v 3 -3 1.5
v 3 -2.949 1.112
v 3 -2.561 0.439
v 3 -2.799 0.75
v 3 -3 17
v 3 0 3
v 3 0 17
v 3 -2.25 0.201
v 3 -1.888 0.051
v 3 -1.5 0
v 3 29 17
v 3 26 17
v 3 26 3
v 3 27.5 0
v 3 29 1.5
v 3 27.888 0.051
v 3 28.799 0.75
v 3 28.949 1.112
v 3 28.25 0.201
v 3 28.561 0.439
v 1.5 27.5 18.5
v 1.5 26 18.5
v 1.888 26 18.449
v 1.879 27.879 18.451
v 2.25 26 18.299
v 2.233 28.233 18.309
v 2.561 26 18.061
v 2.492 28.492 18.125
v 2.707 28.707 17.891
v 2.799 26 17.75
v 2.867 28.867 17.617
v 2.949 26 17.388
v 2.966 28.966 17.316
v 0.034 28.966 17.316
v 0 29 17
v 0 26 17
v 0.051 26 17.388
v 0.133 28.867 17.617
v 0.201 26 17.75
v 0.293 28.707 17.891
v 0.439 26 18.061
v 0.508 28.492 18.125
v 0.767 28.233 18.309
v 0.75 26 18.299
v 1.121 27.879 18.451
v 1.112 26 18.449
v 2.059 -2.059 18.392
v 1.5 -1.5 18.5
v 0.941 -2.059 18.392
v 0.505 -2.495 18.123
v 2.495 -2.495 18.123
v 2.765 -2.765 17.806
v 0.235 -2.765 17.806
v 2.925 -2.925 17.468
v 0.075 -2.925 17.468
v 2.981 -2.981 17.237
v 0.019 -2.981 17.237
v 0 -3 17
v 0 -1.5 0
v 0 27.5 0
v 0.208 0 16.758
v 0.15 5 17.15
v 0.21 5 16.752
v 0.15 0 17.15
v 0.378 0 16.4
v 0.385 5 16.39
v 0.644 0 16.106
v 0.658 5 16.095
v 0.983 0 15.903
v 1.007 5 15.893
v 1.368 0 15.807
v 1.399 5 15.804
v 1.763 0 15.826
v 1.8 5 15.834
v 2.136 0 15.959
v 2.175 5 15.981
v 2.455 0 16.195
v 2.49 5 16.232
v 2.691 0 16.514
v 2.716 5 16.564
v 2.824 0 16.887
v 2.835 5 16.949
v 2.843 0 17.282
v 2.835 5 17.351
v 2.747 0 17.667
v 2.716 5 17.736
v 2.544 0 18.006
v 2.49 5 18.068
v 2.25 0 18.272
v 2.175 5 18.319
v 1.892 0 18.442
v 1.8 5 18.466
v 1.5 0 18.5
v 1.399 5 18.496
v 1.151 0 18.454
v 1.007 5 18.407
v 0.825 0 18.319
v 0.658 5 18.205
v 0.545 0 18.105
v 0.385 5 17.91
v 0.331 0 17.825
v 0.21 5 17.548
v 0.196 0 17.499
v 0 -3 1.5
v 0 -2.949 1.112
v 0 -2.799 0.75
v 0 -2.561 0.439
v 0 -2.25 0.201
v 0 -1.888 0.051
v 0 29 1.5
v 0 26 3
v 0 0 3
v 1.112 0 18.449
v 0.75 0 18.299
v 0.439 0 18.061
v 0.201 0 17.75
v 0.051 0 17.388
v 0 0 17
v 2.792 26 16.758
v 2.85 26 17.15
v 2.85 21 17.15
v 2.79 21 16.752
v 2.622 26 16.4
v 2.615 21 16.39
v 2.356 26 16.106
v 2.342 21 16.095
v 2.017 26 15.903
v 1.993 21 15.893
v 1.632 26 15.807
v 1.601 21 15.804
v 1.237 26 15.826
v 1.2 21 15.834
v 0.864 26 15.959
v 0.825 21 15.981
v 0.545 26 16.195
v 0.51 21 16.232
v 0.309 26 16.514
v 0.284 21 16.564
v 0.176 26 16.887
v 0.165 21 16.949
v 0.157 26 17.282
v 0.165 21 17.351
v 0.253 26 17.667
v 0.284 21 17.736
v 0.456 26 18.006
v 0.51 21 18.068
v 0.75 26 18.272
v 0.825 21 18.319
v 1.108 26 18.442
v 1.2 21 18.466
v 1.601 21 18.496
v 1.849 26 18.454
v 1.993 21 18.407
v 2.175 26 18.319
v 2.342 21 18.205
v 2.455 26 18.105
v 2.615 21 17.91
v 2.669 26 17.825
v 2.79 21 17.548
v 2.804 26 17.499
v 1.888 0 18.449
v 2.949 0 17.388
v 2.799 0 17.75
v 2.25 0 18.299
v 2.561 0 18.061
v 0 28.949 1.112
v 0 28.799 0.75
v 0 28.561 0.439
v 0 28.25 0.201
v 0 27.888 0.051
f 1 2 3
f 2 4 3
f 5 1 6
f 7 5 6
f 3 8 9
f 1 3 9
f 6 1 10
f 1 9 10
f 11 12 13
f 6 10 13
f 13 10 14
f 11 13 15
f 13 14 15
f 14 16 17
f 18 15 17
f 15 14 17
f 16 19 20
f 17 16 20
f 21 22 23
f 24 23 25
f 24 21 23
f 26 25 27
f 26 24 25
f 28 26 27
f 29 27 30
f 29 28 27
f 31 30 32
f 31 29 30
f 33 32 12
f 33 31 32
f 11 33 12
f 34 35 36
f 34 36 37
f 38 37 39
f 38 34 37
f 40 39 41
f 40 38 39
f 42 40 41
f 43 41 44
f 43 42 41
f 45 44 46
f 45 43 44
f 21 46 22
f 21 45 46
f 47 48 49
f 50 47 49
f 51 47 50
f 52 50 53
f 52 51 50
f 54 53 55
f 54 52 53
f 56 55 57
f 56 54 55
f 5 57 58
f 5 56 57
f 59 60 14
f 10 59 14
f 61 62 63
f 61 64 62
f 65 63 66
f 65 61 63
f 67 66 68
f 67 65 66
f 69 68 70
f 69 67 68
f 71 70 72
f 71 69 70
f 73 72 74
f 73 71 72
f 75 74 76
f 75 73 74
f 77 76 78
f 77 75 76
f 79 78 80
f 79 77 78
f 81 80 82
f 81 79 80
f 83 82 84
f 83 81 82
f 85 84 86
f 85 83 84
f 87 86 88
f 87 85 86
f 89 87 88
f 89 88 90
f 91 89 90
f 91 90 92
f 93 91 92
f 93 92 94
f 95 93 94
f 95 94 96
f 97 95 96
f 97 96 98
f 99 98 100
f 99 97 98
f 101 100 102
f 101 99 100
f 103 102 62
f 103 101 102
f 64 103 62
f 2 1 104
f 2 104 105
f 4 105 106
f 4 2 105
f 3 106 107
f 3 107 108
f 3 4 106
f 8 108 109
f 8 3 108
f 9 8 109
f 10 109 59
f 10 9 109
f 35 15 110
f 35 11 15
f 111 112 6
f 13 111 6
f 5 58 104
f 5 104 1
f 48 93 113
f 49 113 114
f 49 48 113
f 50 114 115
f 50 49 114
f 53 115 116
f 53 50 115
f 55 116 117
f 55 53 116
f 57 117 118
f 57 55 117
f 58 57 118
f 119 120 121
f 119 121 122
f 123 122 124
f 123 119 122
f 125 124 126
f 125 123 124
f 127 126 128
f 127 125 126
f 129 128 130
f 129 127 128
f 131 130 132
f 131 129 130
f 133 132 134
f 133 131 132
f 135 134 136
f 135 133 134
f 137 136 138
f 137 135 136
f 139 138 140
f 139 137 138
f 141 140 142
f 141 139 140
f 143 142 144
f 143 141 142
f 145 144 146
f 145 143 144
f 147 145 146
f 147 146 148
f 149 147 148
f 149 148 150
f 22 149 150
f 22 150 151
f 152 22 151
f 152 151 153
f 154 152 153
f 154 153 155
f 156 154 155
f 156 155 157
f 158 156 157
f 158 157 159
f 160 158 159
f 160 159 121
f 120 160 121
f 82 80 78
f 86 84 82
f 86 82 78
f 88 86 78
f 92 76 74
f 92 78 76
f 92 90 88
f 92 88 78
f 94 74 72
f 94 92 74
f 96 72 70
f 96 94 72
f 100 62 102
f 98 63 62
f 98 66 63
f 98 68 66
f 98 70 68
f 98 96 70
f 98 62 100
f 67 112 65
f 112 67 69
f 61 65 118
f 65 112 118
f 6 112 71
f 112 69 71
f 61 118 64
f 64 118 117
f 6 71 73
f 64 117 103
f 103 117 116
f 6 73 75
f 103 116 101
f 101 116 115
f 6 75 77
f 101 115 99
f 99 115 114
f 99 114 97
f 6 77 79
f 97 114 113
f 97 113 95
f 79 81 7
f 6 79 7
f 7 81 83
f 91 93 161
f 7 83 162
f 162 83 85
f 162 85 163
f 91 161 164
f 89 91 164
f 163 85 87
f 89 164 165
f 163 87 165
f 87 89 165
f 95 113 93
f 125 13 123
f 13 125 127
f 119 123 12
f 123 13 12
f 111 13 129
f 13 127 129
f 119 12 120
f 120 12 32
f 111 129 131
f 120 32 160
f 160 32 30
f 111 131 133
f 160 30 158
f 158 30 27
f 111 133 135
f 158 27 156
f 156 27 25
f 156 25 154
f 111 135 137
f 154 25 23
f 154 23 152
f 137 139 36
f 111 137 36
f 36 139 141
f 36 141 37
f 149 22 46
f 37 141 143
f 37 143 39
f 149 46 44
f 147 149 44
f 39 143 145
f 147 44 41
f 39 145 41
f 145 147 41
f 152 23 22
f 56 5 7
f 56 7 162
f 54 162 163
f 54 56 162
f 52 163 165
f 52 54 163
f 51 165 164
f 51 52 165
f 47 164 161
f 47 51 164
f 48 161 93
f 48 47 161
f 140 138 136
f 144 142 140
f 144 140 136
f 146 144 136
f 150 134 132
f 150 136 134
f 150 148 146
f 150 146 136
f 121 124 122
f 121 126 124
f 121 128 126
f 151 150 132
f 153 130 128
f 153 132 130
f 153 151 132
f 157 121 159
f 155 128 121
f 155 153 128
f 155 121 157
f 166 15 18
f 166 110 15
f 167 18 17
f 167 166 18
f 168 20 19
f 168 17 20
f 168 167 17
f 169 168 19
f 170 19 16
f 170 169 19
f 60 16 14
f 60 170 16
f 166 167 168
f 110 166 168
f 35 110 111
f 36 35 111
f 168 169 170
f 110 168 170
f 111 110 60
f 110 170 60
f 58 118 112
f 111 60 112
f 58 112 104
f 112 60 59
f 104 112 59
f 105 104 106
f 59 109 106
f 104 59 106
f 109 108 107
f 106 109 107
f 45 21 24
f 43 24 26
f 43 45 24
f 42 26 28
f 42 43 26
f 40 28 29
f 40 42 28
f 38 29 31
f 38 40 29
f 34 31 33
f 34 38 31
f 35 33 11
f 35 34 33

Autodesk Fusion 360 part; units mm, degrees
sketch "Sketch6" plane through (0, 0, 0) normal (0, 0, 1) x (1, 0, 0)
  line L0 (0, 0) -> (3, 0)
  line L1 (3, 0) -> (3, 26)
  line L2 (3, 26) -> (0, 26)
  line L3 (0, 26) -> (0, 0)
  dimension "d27" = 3
  dimension "d28" = 26
extrude "Extrude8" add sketch "Sketch6" along normal blind 3
sketch "Sketch7" plane through (0, 0, 0) normal (0, 1, 0) x (1, 0, 0)
sketch "Sketch8" plane through (0, 0, 0) normal (0, -1, 0) x (1, 0, 0)
  line L0 (0, 0) -> (3, 0)
  line L1 (3, 0) -> (3, 3)
  line L2 (3, 3) -> (0, 3)
  line L3 (0, 3) -> (0, 0)
  line L4 (3, 3) -> (0, 3)
  line L5 (0, 3) -> (0, 18.5)
  line L6 (0, 18.5) -> (3, 18.5)
  line L7 (3, 18.5) -> (3, 3)
  dimension "d31" = 3
  dimension "d32" = 15.5
extrude "Extrude9" add sketch "Sketch8" along normal blind 3
sketch "Sketch9" plane through (0, 26, 0) normal (0, 1, 0) x (-1, 0, 0)
  line L0 (-3, 0) -> (0, 0)
  line L1 (0, 0) -> (0, 3)
  line L2 (0, 3) -> (-3, 3)
  line L3 (-3, 3) -> (-3, 0)
  line L4 (0, 0) -> (-3, 0)
  line L5 (-3, 0) -> (-3, 18.5)
  line L6 (-3, 18.5) -> (0, 18.5)
  line L7 (0, 18.5) -> (0, 0)
  dimension "d35" = 3
  dimension "d36" = 18.5
extrude "Extrude10" add sketch "Sketch9" along normal blind 3
sketch "Sketch10" plane through (0, 0, 0) normal (0, 1, 0) x (-1, 0, 0)
  line L0 (-3, 3) -> (0, 3)
  line L1 (0, 3) -> (0, 18.5)
  line L2 (0, 18.5) -> (-3, 18.5)
  line L3 (-3, 18.5) -> (-3, 3)
  line L4 (-1.5, 18.5) -> (-1.5, 17)
  circle A0 centre (-1.5, 17) radius 1.5
  dimension "d39" = 1.5
  dimension "d40" = 3
sketch "Sketch12" plane through (0, 26, 0) normal (0, -1, 0) x (1, 0, 0)
  line L0 (0, 3) -> (3, 3)
  line L1 (3, 3) -> (3, 18.5)
  line L2 (3, 18.5) -> (0, 18.5)
  line L3 (0, 18.5) -> (0, 3)
  line L4 (1.5, 18.5) -> (1.5, 17.15)
  circle A0 centre (1.5, 17.15) radius 1.35
  dimension "d53" = 1.35
  dimension "d54" = 2.7
extrude "Extrude15" add sketch "Sketch12" along normal blind 5 contours A0
sketch "Sketch13" plane through (0, 0, 0) normal (0, 1, 0) x (-1, 0, 0)
  line L0 (-3, 3) -> (0, 3)
  line L1 (0, 3) -> (0, 18.5)
  line L2 (0, 18.5) -> (-3, 18.5)
  line L3 (-3, 18.5) -> (-3, 3)
  line L4 (-1.5, 18.5) -> (-1.5, 17.15)
  circle A0 centre (-1.5, 17.15) radius 1.35
  dimension "d57" = 1.35
  dimension "d58" = 2.7
extrude "Extrude16" add sketch "Sketch13" along normal blind 5 contours A0
fillet "Fillet4" radius 1.5 8 edges at (3, -1.5, 18.5) (1.5, -3, 18.5) (0, -1.5, 18.5) (1.5, 29, 18.5) (3, 27.5, 18.5) (0, 27.5, 18.5) (1.5, 29, 0) (1.5, -3, 0)
